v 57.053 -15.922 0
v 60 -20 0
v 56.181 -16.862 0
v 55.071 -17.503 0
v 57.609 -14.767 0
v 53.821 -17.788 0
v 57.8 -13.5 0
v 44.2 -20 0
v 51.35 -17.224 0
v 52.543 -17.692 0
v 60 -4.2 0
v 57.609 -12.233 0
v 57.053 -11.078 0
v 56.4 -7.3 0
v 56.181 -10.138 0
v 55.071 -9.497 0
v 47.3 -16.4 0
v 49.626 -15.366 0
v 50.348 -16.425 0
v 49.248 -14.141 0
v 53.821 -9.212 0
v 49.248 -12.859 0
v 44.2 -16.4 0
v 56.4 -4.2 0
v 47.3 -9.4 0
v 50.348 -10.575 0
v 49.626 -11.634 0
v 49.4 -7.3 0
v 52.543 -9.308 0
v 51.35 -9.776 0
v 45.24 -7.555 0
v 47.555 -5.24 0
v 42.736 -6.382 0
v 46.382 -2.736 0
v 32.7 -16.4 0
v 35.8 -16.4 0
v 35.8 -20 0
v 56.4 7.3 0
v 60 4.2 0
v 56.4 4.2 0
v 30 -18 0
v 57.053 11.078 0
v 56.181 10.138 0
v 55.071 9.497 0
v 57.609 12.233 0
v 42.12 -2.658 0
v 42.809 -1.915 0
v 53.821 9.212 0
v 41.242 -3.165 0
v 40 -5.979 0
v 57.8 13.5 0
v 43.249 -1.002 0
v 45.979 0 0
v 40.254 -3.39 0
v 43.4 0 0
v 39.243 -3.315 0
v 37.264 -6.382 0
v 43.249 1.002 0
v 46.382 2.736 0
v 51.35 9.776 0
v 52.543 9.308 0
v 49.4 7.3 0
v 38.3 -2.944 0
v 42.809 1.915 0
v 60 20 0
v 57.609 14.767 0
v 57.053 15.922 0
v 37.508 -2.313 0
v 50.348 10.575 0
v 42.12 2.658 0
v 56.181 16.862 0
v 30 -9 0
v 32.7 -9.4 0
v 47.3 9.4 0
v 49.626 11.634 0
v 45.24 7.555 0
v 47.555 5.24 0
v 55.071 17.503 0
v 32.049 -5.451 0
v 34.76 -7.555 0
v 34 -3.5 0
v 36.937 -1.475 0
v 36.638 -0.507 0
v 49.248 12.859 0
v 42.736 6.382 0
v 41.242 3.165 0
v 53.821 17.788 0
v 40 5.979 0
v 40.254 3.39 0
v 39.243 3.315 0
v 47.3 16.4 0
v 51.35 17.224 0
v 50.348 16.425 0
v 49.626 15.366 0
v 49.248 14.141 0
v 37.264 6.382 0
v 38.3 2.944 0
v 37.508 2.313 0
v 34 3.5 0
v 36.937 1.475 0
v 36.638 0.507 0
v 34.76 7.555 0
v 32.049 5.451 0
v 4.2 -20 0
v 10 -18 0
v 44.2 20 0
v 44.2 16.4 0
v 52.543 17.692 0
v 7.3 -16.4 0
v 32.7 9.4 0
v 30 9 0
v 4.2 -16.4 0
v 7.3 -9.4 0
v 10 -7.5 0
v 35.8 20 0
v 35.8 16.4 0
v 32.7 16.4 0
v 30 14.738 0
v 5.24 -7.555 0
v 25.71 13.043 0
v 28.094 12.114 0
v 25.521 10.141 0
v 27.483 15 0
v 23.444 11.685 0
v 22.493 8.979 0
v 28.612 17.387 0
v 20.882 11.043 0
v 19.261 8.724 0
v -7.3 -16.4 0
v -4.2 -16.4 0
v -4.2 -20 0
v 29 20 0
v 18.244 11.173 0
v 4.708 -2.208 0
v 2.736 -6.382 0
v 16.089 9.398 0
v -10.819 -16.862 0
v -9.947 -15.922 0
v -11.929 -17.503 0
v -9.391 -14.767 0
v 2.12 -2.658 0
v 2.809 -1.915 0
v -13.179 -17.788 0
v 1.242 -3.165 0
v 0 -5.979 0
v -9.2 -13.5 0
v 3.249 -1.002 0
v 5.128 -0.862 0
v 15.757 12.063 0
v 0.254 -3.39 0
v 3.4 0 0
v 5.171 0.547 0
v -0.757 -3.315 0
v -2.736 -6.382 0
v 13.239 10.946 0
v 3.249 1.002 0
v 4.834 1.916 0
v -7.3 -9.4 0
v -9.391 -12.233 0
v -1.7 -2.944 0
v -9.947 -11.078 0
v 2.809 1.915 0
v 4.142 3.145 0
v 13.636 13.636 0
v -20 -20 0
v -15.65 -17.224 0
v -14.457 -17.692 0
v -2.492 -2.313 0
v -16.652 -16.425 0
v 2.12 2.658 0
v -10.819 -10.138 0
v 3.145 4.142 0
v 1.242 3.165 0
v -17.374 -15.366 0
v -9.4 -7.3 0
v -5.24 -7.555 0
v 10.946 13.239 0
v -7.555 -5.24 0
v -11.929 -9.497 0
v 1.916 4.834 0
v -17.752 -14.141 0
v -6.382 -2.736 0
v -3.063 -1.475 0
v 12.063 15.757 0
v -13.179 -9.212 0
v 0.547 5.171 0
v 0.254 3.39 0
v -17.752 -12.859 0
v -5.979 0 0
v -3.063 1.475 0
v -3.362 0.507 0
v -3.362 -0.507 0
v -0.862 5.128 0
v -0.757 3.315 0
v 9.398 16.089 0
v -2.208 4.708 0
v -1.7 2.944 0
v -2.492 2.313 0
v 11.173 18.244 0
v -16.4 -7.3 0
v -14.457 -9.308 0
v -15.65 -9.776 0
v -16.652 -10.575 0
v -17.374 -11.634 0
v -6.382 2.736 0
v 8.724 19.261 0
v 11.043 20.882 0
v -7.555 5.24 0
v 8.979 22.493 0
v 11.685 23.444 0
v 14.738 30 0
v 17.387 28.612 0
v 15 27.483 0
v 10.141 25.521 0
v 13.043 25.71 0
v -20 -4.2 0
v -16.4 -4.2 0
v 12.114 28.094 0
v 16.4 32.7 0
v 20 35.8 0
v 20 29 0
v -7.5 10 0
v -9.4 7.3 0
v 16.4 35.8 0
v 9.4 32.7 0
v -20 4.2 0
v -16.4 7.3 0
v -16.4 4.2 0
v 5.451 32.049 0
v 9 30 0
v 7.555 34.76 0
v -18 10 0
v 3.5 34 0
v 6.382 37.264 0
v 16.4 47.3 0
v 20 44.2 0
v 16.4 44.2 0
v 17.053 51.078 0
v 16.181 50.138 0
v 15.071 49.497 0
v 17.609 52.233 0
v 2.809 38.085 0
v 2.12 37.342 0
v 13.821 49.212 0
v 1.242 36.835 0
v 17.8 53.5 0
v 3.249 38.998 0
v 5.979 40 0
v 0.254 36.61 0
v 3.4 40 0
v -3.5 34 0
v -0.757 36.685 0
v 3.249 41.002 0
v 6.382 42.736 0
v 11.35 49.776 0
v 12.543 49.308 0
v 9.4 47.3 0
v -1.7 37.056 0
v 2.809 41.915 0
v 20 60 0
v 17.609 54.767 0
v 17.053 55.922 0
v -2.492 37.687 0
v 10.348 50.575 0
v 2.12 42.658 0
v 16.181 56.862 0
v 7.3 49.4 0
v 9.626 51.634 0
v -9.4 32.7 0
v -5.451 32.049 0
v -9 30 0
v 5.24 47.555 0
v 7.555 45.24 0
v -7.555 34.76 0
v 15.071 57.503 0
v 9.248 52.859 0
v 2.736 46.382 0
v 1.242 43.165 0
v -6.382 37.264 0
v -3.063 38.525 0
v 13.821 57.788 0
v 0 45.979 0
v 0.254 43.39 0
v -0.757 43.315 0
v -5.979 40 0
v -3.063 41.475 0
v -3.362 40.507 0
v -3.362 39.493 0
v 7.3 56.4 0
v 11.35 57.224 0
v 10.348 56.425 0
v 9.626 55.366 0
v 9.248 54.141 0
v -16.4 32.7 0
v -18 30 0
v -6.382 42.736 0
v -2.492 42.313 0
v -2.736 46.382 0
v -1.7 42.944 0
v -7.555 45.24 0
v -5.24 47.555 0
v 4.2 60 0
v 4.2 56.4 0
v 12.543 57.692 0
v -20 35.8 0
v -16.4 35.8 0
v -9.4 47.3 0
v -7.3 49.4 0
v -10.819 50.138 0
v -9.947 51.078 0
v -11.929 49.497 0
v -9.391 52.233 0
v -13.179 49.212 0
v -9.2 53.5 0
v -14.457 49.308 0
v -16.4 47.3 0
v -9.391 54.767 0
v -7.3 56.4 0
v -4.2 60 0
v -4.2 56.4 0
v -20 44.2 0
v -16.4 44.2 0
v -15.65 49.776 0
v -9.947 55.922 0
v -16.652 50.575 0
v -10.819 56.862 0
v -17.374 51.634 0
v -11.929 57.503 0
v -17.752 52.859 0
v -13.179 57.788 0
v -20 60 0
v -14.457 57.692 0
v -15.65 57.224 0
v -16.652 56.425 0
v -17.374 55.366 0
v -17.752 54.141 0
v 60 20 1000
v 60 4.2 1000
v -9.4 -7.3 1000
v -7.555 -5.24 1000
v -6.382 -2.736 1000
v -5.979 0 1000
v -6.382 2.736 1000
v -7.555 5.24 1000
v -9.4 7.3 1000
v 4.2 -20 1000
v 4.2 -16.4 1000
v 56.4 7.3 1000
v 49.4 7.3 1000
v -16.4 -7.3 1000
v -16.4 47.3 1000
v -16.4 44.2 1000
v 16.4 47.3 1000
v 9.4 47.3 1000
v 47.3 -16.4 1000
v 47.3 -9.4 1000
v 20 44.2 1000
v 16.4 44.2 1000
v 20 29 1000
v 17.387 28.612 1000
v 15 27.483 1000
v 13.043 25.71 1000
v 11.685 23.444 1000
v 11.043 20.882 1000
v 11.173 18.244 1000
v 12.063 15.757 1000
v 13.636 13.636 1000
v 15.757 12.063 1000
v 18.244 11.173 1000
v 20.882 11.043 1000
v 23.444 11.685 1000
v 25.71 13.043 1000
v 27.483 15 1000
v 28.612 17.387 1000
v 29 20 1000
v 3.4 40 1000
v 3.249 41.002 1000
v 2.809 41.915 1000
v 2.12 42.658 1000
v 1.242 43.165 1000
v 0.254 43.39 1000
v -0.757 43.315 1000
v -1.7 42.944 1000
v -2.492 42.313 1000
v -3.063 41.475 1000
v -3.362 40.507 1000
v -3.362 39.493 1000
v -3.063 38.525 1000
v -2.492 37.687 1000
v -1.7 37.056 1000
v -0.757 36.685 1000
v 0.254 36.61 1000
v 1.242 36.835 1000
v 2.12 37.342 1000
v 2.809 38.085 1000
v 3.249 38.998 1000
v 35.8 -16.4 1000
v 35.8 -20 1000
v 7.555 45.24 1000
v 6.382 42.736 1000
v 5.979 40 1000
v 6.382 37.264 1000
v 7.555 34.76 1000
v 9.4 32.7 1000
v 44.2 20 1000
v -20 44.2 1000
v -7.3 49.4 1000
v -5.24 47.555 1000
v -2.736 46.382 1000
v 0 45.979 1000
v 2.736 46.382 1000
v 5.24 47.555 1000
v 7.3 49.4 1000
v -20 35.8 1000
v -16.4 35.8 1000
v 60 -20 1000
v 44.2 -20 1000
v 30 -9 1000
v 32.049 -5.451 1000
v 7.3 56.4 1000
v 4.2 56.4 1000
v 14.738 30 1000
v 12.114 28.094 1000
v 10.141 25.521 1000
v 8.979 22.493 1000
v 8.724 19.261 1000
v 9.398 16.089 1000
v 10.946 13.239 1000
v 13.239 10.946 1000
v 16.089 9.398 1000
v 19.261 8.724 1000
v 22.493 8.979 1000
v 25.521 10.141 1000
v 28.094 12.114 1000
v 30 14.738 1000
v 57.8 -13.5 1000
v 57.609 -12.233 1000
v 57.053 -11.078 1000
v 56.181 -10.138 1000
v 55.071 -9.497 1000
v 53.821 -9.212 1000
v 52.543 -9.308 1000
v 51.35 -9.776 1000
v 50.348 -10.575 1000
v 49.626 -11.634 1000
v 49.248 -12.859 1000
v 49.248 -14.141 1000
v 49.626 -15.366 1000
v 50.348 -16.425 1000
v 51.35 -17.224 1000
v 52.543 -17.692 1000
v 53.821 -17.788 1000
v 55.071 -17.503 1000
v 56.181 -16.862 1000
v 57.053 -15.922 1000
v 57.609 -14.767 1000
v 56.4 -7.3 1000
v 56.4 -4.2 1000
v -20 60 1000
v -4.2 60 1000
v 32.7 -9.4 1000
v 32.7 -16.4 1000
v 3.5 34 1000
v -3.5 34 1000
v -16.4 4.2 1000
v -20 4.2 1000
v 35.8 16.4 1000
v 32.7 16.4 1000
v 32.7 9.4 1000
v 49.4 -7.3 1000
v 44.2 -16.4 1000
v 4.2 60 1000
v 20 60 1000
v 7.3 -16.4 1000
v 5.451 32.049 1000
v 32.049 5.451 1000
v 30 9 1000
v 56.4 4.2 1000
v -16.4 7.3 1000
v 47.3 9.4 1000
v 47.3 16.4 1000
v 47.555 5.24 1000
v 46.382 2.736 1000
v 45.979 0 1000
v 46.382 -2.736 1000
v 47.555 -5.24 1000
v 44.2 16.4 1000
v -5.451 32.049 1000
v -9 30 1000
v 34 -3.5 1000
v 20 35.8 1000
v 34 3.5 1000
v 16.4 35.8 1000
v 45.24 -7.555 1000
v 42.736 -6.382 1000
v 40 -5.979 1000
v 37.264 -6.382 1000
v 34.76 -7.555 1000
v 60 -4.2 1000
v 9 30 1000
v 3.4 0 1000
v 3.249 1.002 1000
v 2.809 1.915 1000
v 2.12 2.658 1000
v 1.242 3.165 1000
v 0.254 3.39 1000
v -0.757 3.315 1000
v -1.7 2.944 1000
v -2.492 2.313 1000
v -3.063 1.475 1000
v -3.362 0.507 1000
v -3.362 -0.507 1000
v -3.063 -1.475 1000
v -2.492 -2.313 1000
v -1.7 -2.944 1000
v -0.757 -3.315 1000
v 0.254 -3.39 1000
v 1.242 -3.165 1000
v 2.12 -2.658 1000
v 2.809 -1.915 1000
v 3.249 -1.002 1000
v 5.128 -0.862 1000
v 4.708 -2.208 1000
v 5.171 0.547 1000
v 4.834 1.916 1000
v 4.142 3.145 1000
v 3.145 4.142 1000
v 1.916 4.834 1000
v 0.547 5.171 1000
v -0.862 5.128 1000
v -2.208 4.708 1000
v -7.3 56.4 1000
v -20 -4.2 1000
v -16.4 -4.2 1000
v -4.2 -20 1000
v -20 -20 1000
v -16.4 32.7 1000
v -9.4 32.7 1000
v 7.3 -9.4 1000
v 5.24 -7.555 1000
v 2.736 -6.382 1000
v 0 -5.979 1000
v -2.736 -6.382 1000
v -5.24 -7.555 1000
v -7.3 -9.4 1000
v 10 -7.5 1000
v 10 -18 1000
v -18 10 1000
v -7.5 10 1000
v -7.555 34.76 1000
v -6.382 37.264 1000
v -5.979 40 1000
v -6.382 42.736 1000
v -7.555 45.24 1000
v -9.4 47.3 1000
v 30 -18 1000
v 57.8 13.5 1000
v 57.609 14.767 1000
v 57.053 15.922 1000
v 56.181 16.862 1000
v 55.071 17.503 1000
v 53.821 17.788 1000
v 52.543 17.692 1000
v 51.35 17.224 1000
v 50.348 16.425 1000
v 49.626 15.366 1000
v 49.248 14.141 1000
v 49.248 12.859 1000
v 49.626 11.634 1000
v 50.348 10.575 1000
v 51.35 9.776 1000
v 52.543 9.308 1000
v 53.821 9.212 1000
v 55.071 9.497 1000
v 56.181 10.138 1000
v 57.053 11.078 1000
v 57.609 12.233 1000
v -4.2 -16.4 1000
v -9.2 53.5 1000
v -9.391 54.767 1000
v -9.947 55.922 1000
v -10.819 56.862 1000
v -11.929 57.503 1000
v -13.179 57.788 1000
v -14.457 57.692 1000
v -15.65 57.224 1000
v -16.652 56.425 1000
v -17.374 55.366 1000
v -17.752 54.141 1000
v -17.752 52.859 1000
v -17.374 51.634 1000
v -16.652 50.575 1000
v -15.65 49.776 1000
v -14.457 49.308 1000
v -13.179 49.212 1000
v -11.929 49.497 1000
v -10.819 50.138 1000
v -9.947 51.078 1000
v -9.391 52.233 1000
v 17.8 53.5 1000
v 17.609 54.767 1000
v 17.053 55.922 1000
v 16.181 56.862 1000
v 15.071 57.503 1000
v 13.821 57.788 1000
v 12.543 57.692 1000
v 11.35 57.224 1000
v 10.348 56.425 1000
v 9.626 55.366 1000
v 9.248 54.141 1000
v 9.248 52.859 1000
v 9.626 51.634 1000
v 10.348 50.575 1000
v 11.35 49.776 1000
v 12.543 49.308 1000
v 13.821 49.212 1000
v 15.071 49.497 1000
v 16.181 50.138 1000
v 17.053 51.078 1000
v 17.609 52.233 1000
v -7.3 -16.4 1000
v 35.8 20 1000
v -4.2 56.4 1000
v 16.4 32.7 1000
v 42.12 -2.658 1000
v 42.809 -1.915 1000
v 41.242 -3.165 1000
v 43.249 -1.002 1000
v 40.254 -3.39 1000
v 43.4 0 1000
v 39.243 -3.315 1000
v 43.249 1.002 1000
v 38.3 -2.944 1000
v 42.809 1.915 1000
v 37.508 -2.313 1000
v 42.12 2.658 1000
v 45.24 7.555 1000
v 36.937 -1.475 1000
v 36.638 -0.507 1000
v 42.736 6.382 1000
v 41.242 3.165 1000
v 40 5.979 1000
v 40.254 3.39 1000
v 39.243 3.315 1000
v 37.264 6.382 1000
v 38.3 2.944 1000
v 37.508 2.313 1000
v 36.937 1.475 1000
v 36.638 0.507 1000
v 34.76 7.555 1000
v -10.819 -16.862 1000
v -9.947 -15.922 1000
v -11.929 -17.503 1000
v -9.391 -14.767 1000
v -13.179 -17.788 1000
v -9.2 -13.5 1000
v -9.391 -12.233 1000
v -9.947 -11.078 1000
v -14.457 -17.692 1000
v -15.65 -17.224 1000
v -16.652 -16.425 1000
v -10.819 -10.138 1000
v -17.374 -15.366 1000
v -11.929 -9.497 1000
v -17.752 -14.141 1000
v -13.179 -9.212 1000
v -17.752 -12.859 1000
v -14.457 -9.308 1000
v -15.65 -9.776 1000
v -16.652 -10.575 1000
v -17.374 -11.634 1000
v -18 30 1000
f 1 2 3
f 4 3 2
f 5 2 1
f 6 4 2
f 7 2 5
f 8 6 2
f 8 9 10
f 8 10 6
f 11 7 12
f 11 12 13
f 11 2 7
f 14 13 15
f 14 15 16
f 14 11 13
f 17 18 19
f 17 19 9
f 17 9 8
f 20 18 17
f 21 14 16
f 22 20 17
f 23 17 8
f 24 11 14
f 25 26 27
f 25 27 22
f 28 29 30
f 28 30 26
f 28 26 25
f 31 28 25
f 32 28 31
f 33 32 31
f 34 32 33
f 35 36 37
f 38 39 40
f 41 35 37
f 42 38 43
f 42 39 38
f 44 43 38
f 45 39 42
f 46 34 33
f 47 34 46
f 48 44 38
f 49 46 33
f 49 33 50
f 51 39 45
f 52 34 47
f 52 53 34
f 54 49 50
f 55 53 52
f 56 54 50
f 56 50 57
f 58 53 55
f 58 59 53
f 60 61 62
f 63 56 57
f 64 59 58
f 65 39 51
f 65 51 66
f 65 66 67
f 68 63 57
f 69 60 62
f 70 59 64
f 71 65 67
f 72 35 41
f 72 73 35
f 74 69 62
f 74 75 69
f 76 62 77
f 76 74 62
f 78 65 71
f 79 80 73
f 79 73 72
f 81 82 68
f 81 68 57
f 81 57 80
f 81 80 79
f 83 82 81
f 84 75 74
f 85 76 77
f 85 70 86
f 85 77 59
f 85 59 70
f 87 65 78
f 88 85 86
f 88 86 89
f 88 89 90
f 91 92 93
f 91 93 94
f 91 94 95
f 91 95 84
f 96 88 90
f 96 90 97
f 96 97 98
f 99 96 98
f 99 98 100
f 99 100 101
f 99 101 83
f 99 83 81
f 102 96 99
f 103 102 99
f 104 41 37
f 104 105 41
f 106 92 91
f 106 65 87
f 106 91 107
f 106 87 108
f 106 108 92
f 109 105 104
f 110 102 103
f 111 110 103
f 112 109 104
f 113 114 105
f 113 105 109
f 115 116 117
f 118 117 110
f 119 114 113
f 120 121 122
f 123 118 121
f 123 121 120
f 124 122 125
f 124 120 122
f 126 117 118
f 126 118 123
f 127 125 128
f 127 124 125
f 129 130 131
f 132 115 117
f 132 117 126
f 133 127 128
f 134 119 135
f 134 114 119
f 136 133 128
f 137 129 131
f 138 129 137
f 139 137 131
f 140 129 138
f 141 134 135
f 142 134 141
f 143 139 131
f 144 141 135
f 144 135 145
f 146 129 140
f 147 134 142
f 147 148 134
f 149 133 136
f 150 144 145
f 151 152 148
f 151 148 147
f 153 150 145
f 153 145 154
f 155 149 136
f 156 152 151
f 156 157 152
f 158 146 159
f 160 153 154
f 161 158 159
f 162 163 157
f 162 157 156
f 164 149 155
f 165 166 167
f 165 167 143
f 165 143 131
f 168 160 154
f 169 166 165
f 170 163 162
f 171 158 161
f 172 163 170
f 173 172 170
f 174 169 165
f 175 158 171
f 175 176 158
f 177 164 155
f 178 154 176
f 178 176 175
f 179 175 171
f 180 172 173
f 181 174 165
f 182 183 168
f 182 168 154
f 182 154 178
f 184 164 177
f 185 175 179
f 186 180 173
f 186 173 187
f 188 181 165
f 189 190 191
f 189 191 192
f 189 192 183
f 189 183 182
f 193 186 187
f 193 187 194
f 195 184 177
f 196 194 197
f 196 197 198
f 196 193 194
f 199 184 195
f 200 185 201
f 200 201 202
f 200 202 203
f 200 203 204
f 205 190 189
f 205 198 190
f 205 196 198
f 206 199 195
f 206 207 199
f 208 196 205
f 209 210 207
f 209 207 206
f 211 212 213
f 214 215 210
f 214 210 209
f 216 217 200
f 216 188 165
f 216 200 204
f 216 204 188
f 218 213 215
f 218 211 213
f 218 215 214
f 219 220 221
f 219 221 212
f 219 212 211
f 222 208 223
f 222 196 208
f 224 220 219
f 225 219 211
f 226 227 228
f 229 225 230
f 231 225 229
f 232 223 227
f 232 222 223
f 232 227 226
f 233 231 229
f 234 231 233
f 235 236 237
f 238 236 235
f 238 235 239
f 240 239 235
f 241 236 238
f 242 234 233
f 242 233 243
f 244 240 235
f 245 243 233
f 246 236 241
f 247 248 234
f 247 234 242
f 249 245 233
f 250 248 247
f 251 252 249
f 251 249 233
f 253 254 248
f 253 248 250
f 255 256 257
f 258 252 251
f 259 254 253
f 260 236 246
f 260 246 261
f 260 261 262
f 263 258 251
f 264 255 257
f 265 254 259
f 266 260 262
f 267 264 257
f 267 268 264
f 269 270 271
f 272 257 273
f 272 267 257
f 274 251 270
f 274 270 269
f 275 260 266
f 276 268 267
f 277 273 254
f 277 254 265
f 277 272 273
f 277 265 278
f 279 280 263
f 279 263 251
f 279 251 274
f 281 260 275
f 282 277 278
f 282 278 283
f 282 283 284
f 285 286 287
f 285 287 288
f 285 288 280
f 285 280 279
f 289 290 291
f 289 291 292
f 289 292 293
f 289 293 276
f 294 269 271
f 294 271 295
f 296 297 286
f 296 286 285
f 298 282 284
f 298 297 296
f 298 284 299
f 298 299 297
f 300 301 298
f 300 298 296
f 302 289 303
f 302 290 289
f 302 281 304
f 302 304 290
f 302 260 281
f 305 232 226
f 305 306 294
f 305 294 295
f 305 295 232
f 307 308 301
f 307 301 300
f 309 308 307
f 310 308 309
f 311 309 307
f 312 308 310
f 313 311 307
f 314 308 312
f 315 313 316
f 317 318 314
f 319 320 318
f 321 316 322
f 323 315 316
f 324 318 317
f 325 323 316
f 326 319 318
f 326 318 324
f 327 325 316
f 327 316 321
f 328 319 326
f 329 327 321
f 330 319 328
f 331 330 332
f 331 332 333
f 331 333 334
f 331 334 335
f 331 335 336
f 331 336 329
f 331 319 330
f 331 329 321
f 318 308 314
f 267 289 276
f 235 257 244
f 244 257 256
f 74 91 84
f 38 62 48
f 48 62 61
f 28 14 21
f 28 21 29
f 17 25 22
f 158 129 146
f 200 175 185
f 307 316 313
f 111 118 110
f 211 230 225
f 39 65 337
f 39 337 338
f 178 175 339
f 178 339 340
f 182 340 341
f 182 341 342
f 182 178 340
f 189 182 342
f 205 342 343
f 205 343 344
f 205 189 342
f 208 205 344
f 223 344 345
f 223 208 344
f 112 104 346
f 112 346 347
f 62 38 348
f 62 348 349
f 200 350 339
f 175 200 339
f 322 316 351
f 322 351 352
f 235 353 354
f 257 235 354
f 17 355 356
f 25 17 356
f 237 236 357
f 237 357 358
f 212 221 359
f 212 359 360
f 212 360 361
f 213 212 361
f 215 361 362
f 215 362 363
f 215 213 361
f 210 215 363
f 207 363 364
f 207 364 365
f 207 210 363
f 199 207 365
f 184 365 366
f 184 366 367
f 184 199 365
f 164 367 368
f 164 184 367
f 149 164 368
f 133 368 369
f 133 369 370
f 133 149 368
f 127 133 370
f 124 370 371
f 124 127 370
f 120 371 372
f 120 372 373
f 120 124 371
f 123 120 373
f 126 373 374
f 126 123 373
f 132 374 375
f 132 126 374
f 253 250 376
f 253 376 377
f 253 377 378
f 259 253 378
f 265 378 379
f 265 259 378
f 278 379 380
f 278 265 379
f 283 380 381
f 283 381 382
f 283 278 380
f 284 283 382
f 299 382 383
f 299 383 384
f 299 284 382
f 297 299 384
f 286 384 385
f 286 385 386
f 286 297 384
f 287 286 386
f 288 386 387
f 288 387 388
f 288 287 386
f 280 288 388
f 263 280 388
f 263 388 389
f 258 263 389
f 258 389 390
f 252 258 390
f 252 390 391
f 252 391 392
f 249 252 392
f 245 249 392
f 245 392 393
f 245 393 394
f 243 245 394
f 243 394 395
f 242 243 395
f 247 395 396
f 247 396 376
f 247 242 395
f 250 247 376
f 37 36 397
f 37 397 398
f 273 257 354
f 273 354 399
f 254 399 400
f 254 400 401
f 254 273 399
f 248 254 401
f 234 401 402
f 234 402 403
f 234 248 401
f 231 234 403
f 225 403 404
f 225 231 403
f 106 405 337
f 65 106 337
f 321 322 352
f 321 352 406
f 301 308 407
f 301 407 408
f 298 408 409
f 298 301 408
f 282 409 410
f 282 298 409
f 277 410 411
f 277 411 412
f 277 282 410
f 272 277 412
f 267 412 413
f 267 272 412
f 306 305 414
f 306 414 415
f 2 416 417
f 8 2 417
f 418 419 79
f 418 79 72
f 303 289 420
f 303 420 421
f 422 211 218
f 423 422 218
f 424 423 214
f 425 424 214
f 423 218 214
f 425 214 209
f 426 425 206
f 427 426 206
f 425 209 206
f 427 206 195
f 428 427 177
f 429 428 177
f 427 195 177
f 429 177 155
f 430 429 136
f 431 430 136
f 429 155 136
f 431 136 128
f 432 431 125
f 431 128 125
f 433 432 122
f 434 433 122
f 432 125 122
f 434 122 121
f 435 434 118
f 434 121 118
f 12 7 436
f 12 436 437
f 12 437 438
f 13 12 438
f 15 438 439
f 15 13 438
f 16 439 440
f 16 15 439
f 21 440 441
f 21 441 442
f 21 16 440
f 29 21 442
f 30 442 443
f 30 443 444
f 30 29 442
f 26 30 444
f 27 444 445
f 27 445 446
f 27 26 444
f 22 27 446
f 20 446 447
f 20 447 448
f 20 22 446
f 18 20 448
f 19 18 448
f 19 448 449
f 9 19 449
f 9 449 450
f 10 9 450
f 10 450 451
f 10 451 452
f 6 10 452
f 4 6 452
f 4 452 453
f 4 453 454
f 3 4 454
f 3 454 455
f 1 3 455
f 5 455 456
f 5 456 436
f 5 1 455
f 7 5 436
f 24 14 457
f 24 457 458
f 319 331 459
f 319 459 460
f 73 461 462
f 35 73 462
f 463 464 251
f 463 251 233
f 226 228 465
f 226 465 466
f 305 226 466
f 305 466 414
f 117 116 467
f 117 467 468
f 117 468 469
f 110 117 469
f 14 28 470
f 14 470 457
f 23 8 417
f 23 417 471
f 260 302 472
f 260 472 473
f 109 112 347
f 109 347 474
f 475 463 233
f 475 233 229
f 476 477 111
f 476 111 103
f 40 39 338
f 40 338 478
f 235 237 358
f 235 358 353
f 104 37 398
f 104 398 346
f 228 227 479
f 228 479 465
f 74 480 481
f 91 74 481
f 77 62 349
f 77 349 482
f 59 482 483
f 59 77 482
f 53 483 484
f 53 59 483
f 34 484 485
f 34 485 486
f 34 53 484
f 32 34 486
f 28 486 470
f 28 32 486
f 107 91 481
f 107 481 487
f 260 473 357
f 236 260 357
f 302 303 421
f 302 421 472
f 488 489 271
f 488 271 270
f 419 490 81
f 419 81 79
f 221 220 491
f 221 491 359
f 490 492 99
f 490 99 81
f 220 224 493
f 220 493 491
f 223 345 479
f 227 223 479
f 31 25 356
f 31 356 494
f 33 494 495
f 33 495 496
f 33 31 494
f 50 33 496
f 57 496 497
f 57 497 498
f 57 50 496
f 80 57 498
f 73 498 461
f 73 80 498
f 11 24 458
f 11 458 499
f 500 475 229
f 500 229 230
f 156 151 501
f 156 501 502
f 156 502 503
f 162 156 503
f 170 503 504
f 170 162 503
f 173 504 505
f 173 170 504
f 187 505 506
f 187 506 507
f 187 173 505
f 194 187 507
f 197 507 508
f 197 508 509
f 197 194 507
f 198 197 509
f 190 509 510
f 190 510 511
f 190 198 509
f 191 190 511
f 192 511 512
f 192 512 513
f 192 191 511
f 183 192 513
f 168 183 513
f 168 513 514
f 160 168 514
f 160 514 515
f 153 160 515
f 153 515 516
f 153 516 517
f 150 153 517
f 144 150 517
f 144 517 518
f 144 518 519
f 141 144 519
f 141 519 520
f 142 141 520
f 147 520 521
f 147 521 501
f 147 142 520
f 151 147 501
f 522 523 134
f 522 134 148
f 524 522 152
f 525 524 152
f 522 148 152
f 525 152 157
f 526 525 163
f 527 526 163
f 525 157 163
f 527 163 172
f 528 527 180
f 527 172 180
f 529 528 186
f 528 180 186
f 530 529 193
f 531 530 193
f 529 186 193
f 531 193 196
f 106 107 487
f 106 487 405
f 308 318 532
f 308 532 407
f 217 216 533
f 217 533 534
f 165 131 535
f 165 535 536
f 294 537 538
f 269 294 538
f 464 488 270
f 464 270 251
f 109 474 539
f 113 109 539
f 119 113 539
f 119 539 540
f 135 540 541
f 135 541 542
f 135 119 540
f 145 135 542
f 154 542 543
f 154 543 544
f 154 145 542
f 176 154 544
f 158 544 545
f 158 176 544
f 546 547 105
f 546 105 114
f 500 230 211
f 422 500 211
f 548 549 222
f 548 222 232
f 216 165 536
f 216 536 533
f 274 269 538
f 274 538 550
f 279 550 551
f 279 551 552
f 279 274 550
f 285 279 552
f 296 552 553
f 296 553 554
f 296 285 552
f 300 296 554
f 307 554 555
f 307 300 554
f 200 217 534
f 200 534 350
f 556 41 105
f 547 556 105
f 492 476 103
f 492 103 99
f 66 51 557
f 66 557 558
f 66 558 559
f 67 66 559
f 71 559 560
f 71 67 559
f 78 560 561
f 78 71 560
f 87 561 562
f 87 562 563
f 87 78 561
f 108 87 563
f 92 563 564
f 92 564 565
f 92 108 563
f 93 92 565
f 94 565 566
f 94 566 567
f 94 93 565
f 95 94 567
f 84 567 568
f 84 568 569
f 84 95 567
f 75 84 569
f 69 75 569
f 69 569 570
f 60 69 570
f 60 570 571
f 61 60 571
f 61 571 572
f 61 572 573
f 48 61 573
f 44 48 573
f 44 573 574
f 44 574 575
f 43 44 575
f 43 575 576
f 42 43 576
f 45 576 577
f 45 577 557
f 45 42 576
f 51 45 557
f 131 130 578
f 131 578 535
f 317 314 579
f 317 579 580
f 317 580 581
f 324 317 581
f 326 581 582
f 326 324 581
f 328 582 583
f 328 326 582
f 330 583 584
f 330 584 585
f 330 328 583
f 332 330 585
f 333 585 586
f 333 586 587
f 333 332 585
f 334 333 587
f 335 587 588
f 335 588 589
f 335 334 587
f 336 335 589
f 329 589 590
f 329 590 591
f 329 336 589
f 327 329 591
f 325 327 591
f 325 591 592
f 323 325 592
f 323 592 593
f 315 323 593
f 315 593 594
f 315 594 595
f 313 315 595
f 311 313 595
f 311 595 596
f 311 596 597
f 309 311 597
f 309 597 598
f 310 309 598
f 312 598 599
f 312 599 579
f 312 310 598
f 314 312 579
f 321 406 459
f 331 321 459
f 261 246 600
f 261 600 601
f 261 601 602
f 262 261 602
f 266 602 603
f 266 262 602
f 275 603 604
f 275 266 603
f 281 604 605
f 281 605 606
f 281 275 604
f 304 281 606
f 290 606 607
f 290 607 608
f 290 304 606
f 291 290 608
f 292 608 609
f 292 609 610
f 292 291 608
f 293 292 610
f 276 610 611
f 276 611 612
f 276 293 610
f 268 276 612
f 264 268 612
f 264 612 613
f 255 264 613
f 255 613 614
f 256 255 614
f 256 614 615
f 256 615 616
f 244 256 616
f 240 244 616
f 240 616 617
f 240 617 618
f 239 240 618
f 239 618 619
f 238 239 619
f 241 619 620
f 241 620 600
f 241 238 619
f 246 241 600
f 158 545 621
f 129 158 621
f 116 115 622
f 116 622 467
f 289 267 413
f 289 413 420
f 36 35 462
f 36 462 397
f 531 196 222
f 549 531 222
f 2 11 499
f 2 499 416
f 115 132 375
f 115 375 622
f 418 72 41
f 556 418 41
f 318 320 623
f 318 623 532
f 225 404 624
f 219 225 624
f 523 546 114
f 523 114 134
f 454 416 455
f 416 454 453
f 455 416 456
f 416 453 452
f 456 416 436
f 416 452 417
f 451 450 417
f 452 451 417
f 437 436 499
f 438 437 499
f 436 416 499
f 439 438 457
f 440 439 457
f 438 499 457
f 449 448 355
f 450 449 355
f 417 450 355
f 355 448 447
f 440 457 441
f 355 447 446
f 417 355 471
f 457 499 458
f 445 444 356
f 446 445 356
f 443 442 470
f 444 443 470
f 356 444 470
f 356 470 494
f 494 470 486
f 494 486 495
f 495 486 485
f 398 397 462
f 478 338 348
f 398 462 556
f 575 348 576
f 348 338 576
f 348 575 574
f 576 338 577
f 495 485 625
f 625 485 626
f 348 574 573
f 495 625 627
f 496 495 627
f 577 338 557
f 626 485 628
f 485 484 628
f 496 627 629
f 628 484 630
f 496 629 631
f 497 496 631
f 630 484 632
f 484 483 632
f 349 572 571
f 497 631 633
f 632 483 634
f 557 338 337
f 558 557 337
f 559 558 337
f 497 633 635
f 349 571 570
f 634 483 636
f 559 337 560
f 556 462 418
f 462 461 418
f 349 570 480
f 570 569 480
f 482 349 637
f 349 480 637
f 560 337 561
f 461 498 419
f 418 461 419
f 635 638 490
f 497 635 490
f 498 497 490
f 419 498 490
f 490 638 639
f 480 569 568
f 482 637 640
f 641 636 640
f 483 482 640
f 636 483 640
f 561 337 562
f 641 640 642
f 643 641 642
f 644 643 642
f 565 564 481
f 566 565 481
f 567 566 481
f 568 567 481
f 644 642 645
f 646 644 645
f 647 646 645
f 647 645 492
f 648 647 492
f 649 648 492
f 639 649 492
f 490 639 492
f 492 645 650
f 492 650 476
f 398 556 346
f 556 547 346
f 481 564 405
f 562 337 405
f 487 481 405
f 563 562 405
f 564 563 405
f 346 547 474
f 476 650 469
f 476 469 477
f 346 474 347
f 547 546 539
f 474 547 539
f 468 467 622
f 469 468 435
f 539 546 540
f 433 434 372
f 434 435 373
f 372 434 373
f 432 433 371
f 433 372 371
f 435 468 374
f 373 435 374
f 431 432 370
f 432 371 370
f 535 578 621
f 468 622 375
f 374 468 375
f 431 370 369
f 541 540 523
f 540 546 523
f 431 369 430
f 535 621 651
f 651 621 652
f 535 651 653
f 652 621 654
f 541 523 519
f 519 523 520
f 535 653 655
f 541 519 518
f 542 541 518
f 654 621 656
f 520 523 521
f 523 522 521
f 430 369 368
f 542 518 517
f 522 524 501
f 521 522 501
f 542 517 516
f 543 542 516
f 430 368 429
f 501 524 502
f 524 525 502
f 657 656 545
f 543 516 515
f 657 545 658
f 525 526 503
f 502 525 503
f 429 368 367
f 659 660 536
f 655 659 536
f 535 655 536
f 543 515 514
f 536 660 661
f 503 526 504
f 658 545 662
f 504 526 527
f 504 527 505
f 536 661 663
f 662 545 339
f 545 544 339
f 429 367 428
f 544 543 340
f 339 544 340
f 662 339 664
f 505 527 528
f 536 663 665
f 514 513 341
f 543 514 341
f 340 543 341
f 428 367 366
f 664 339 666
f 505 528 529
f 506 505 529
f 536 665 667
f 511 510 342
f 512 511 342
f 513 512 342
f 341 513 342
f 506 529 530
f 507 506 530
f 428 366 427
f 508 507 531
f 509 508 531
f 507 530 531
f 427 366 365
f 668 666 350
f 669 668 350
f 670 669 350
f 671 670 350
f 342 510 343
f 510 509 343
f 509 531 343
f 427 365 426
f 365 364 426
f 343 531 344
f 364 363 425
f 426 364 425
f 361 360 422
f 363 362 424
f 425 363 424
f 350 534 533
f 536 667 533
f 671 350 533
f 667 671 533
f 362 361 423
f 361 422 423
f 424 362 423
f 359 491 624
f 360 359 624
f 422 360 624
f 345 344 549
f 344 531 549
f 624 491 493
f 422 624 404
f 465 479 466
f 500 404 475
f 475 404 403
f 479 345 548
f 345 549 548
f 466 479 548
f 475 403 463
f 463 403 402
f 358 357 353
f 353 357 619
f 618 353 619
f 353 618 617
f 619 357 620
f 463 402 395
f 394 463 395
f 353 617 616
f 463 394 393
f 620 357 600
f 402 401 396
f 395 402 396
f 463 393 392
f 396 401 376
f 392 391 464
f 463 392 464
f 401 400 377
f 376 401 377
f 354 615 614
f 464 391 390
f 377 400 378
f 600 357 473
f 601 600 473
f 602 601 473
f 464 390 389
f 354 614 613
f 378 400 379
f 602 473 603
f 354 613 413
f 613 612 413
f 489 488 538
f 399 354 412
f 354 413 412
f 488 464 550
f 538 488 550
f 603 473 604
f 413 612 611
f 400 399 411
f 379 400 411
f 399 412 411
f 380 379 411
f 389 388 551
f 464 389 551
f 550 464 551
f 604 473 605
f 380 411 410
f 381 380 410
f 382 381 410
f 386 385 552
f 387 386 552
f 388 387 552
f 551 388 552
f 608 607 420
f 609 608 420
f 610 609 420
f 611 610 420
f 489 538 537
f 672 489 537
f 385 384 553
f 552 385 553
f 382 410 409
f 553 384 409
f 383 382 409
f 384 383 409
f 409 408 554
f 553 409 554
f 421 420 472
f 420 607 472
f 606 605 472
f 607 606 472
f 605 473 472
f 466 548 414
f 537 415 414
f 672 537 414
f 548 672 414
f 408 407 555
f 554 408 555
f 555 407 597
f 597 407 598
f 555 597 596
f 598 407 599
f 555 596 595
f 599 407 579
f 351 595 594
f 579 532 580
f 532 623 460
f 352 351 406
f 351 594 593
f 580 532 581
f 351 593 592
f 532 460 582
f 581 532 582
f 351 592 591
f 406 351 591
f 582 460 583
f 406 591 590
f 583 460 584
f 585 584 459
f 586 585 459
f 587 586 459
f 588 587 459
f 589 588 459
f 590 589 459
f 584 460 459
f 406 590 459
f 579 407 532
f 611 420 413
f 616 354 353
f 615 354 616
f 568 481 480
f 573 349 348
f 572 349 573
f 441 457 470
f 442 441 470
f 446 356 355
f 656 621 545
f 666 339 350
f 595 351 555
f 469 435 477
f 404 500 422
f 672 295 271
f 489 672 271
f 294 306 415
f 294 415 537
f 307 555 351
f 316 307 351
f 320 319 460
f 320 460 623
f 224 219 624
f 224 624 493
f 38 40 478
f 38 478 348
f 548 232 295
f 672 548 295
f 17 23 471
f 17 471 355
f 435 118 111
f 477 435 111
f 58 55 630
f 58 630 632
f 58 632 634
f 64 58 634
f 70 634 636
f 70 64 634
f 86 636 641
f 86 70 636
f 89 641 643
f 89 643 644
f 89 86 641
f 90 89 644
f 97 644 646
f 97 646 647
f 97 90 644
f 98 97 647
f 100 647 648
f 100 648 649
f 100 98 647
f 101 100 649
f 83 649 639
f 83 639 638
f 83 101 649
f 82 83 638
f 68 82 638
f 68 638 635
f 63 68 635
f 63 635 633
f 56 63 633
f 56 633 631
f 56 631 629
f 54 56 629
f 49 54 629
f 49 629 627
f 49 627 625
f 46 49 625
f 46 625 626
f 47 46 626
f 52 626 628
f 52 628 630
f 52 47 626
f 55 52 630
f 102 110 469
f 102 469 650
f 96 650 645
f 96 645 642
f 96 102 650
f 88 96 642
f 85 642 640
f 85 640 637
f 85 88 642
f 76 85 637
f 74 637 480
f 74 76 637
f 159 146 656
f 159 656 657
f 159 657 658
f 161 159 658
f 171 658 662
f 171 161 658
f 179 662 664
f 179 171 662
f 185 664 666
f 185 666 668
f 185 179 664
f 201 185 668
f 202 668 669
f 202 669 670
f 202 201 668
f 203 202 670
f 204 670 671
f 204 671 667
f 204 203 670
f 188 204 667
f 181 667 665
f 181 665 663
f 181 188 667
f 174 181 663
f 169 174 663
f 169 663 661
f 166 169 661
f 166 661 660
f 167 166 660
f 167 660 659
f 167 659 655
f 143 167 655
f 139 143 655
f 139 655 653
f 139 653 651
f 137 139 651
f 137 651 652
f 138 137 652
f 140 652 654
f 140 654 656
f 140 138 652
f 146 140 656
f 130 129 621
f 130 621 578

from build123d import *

# Parameters (mm, degrees)
SKETCH_1_R      = 3.4
SKETCH_1_R_2    = 4.3
EXTRUDE_1_DEPTH = 1000


with BuildPart() as part:
    # Эскиз1 → Бобышка-Вытянуть1 (new body)
    with BuildSketch(Plane.XY):
        with BuildLine():
            Line((-20, 47.3), (-20, 60))
            Line((-20, 60), (-7.3, 60))
            Line((-7.3, 60), (-4.2, 60))
            Line((-4.2, 60), (-4.2, 56.4))
            Line((-4.2, 56.4), (-7.3, 56.4))
            Line((-7.3, 56.4), (-7.3, 49.4))
            ThreePointArc((-7.3, 49.4), (0, 45.979473661), (7.3, 49.4))
            Line((7.3, 49.4), (7.3, 56.4))
            Line((7.3, 56.4), (4.2, 56.4))
            Line((4.2, 56.4), (4.2, 60))
            Line((4.2, 60), (7.3, 60))
            Line((7.3, 60), (20, 60))
            Line((20, 60), (20, 47.3))
            Line((20, 47.3), (20, 44.2))
            Line((20, 44.2), (16.4, 44.2))
            Line((16.4, 44.2), (16.4, 47.3))
            Line((16.4, 47.3), (9.4, 47.3))
            ThreePointArc((9.4, 47.3), (5.979473661, 40), (9.4, 32.7))
            Line((9.4, 32.7), (16.4, 32.7))
            Line((16.4, 32.7), (16.4, 35.8))
            Line((16.4, 35.8), (20, 35.8))
            Line((20, 35.8), (20, 32.7))
            Line((20, 32.7), (20, 29))
            ThreePointArc((20, 29), (13.636038969, 13.636038969), (29, 20))
            Line((29, 20), (32.7, 20))
            Line((32.7, 20), (35.8, 20))
            Line((35.8, 20), (35.8, 16.4))
            Line((35.8, 16.4), (32.7, 16.4))
            Line((32.7, 16.4), (32.7, 9.4))
            ThreePointArc((32.7, 9.4), (40, 5.979473661), (47.3, 9.4))
            Line((47.3, 9.4), (47.3, 16.4))
            Line((47.3, 16.4), (44.2, 16.4))
            Line((44.2, 16.4), (44.2, 20))
            Line((44.2, 20), (47.3, 20))
            Line((47.3, 20), (60, 20))
            Line((60, 20), (60, 7.3))
            Line((60, 7.3), (60, 4.2))
            Line((60, 4.2), (56.4, 4.2))
            Line((56.4, 4.2), (56.4, 7.3))
            Line((56.4, 7.3), (49.4, 7.3))
            ThreePointArc((49.4, 7.3), (45.979473661, 0), (49.4, -7.3))
            Line((49.4, -7.3), (56.4, -7.3))
            Line((56.4, -7.3), (56.4, -4.2))
            Line((56.4, -4.2), (60, -4.2))
            Line((60, -4.2), (60, -7.3))
            Line((60, -7.3), (60, -20))
            Line((60, -20), (47.3, -20))
            Line((47.3, -20), (44.2, -20))
            Line((44.2, -20), (44.2, -16.4))
            Line((44.2, -16.4), (47.3, -16.4))
            Line((47.3, -16.4), (47.3, -9.4))
            ThreePointArc((47.3, -9.4), (40, -5.979473661), (32.7, -9.4))
            Line((32.7, -9.4), (32.7, -16.4))
            Line((32.7, -16.4), (35.8, -16.4))
            Line((35.8, -16.4), (35.8, -20))
            Line((35.8, -20), (32.7, -20))
            Line((32.7, -20), (7.3, -20))
            Line((7.3, -20), (4.2, -20))
            Line((4.2, -20), (4.2, -16.4))
            Line((4.2, -16.4), (7.3, -16.4))
            Line((7.3, -16.4), (7.3, -9.4))
            ThreePointArc((7.3, -9.4), (0, -5.979473661), (-7.3, -9.4))
            Line((-7.3, -9.4), (-7.3, -16.4))
            Line((-7.3, -16.4), (-4.2, -16.4))
            Line((-4.2, -16.4), (-4.2, -20))
            Line((-4.2, -20), (-7.3, -20))
            Line((-7.3, -20), (-20, -20))
            Line((-20, -20), (-20, -7.3))
            Line((-20, -7.3), (-20, -4.2))
            Line((-20, -4.2), (-16.4, -4.2))
            Line((-16.4, -4.2), (-16.4, -7.3))
            Line((-16.4, -7.3), (-9.4, -7.3))
            ThreePointArc((-9.4, -7.3), (-5.979473661, 0), (-9.4, 7.3))
            Line((-9.4, 7.3), (-16.4, 7.3))
            Line((-16.4, 7.3), (-16.4, 4.2))
            Line((-16.4, 4.2), (-20, 4.2))
            Line((-20, 4.2), (-20, 7.3))
            Line((-20, 7.3), (-20, 32.7))
            Line((-20, 32.7), (-20, 35.8))
            Line((-20, 35.8), (-16.4, 35.8))
            Line((-16.4, 35.8), (-16.4, 32.7))
            Line((-16.4, 32.7), (-9.4, 32.7))
            ThreePointArc((-9.4, 32.7), (-5.979473661, 40), (-9.4, 47.3))
            Line((-9.4, 47.3), (-16.4, 47.3))
            Line((-16.4, 47.3), (-16.4, 44.2))
            Line((-16.4, 44.2), (-20, 44.2))
            Line((-20, 44.2), (-20, 47.3))
        make_face()
        with Locations((0, 40)):
            Circle(SKETCH_1_R, mode=Mode.SUBTRACT)
        with Locations((-13.5, 53.5)):
            Circle(SKETCH_1_R_2, mode=Mode.SUBTRACT)
        with Locations((13.5, 53.5)):
            Circle(SKETCH_1_R_2, mode=Mode.SUBTRACT)
        with Locations((-13.5, -13.5)):
            Circle(SKETCH_1_R_2, mode=Mode.SUBTRACT)
        Circle(SKETCH_1_R, mode=Mode.SUBTRACT)
        with Locations((40, 0)):
            Circle(SKETCH_1_R, mode=Mode.SUBTRACT)
        with Locations((53.5, 13.5)):
            Circle(SKETCH_1_R_2, mode=Mode.SUBTRACT)
        with Locations((53.5, -13.5)):
            Circle(SKETCH_1_R_2, mode=Mode.SUBTRACT)
        with BuildLine():
            Line((-2.207961827, 4.707961827), (-7.5, 10))
            Line((-7.5, 10), (-18, 10))
            Line((-18, 10), (-18, 30))
            Line((-18, 30), (-9, 30))
            Line((-9, 30), (-5.450961894, 32.049038106))
            Line((-5.450961894, 32.049038106), (-3.5, 34))
            Line((-3.5, 34), (3.5, 34))
            Line((3.5, 34), (5.450961894, 32.049038106))
            Line((5.450961894, 32.049038106), (9, 30))
            Line((9, 30), (14.737871153, 30))
            ThreePointArc((14.737871153, 30), (12.009693373, 12.009693373), (30, 14.737871153))
            Line((30, 14.737871153), (30, 9))
            Line((30, 9), (32.049038106, 5.450961894))
            Line((32.049038106, 5.450961894), (34, 3.5))
            Line((34, 3.5), (34, -3.5))
            Line((34, -3.5), (32.049038106, -5.450961894))
            Line((32.049038106, -5.450961894), (30, -9))
            Line((30, -9), (30, -18))
            Line((30, -18), (10, -18))
            Line((10, -18), (10, -7.5))
            Line((10, -7.5), (4.707961827, -2.207961827))
            ThreePointArc((4.707961827, -2.207961827), (3.676955262, 3.676955262), (-2.207961827, 4.707961827))
        make_face(mode=Mode.SUBTRACT)
    extrude(amount=EXTRUDE_1_DEPTH)


solid = part.part
